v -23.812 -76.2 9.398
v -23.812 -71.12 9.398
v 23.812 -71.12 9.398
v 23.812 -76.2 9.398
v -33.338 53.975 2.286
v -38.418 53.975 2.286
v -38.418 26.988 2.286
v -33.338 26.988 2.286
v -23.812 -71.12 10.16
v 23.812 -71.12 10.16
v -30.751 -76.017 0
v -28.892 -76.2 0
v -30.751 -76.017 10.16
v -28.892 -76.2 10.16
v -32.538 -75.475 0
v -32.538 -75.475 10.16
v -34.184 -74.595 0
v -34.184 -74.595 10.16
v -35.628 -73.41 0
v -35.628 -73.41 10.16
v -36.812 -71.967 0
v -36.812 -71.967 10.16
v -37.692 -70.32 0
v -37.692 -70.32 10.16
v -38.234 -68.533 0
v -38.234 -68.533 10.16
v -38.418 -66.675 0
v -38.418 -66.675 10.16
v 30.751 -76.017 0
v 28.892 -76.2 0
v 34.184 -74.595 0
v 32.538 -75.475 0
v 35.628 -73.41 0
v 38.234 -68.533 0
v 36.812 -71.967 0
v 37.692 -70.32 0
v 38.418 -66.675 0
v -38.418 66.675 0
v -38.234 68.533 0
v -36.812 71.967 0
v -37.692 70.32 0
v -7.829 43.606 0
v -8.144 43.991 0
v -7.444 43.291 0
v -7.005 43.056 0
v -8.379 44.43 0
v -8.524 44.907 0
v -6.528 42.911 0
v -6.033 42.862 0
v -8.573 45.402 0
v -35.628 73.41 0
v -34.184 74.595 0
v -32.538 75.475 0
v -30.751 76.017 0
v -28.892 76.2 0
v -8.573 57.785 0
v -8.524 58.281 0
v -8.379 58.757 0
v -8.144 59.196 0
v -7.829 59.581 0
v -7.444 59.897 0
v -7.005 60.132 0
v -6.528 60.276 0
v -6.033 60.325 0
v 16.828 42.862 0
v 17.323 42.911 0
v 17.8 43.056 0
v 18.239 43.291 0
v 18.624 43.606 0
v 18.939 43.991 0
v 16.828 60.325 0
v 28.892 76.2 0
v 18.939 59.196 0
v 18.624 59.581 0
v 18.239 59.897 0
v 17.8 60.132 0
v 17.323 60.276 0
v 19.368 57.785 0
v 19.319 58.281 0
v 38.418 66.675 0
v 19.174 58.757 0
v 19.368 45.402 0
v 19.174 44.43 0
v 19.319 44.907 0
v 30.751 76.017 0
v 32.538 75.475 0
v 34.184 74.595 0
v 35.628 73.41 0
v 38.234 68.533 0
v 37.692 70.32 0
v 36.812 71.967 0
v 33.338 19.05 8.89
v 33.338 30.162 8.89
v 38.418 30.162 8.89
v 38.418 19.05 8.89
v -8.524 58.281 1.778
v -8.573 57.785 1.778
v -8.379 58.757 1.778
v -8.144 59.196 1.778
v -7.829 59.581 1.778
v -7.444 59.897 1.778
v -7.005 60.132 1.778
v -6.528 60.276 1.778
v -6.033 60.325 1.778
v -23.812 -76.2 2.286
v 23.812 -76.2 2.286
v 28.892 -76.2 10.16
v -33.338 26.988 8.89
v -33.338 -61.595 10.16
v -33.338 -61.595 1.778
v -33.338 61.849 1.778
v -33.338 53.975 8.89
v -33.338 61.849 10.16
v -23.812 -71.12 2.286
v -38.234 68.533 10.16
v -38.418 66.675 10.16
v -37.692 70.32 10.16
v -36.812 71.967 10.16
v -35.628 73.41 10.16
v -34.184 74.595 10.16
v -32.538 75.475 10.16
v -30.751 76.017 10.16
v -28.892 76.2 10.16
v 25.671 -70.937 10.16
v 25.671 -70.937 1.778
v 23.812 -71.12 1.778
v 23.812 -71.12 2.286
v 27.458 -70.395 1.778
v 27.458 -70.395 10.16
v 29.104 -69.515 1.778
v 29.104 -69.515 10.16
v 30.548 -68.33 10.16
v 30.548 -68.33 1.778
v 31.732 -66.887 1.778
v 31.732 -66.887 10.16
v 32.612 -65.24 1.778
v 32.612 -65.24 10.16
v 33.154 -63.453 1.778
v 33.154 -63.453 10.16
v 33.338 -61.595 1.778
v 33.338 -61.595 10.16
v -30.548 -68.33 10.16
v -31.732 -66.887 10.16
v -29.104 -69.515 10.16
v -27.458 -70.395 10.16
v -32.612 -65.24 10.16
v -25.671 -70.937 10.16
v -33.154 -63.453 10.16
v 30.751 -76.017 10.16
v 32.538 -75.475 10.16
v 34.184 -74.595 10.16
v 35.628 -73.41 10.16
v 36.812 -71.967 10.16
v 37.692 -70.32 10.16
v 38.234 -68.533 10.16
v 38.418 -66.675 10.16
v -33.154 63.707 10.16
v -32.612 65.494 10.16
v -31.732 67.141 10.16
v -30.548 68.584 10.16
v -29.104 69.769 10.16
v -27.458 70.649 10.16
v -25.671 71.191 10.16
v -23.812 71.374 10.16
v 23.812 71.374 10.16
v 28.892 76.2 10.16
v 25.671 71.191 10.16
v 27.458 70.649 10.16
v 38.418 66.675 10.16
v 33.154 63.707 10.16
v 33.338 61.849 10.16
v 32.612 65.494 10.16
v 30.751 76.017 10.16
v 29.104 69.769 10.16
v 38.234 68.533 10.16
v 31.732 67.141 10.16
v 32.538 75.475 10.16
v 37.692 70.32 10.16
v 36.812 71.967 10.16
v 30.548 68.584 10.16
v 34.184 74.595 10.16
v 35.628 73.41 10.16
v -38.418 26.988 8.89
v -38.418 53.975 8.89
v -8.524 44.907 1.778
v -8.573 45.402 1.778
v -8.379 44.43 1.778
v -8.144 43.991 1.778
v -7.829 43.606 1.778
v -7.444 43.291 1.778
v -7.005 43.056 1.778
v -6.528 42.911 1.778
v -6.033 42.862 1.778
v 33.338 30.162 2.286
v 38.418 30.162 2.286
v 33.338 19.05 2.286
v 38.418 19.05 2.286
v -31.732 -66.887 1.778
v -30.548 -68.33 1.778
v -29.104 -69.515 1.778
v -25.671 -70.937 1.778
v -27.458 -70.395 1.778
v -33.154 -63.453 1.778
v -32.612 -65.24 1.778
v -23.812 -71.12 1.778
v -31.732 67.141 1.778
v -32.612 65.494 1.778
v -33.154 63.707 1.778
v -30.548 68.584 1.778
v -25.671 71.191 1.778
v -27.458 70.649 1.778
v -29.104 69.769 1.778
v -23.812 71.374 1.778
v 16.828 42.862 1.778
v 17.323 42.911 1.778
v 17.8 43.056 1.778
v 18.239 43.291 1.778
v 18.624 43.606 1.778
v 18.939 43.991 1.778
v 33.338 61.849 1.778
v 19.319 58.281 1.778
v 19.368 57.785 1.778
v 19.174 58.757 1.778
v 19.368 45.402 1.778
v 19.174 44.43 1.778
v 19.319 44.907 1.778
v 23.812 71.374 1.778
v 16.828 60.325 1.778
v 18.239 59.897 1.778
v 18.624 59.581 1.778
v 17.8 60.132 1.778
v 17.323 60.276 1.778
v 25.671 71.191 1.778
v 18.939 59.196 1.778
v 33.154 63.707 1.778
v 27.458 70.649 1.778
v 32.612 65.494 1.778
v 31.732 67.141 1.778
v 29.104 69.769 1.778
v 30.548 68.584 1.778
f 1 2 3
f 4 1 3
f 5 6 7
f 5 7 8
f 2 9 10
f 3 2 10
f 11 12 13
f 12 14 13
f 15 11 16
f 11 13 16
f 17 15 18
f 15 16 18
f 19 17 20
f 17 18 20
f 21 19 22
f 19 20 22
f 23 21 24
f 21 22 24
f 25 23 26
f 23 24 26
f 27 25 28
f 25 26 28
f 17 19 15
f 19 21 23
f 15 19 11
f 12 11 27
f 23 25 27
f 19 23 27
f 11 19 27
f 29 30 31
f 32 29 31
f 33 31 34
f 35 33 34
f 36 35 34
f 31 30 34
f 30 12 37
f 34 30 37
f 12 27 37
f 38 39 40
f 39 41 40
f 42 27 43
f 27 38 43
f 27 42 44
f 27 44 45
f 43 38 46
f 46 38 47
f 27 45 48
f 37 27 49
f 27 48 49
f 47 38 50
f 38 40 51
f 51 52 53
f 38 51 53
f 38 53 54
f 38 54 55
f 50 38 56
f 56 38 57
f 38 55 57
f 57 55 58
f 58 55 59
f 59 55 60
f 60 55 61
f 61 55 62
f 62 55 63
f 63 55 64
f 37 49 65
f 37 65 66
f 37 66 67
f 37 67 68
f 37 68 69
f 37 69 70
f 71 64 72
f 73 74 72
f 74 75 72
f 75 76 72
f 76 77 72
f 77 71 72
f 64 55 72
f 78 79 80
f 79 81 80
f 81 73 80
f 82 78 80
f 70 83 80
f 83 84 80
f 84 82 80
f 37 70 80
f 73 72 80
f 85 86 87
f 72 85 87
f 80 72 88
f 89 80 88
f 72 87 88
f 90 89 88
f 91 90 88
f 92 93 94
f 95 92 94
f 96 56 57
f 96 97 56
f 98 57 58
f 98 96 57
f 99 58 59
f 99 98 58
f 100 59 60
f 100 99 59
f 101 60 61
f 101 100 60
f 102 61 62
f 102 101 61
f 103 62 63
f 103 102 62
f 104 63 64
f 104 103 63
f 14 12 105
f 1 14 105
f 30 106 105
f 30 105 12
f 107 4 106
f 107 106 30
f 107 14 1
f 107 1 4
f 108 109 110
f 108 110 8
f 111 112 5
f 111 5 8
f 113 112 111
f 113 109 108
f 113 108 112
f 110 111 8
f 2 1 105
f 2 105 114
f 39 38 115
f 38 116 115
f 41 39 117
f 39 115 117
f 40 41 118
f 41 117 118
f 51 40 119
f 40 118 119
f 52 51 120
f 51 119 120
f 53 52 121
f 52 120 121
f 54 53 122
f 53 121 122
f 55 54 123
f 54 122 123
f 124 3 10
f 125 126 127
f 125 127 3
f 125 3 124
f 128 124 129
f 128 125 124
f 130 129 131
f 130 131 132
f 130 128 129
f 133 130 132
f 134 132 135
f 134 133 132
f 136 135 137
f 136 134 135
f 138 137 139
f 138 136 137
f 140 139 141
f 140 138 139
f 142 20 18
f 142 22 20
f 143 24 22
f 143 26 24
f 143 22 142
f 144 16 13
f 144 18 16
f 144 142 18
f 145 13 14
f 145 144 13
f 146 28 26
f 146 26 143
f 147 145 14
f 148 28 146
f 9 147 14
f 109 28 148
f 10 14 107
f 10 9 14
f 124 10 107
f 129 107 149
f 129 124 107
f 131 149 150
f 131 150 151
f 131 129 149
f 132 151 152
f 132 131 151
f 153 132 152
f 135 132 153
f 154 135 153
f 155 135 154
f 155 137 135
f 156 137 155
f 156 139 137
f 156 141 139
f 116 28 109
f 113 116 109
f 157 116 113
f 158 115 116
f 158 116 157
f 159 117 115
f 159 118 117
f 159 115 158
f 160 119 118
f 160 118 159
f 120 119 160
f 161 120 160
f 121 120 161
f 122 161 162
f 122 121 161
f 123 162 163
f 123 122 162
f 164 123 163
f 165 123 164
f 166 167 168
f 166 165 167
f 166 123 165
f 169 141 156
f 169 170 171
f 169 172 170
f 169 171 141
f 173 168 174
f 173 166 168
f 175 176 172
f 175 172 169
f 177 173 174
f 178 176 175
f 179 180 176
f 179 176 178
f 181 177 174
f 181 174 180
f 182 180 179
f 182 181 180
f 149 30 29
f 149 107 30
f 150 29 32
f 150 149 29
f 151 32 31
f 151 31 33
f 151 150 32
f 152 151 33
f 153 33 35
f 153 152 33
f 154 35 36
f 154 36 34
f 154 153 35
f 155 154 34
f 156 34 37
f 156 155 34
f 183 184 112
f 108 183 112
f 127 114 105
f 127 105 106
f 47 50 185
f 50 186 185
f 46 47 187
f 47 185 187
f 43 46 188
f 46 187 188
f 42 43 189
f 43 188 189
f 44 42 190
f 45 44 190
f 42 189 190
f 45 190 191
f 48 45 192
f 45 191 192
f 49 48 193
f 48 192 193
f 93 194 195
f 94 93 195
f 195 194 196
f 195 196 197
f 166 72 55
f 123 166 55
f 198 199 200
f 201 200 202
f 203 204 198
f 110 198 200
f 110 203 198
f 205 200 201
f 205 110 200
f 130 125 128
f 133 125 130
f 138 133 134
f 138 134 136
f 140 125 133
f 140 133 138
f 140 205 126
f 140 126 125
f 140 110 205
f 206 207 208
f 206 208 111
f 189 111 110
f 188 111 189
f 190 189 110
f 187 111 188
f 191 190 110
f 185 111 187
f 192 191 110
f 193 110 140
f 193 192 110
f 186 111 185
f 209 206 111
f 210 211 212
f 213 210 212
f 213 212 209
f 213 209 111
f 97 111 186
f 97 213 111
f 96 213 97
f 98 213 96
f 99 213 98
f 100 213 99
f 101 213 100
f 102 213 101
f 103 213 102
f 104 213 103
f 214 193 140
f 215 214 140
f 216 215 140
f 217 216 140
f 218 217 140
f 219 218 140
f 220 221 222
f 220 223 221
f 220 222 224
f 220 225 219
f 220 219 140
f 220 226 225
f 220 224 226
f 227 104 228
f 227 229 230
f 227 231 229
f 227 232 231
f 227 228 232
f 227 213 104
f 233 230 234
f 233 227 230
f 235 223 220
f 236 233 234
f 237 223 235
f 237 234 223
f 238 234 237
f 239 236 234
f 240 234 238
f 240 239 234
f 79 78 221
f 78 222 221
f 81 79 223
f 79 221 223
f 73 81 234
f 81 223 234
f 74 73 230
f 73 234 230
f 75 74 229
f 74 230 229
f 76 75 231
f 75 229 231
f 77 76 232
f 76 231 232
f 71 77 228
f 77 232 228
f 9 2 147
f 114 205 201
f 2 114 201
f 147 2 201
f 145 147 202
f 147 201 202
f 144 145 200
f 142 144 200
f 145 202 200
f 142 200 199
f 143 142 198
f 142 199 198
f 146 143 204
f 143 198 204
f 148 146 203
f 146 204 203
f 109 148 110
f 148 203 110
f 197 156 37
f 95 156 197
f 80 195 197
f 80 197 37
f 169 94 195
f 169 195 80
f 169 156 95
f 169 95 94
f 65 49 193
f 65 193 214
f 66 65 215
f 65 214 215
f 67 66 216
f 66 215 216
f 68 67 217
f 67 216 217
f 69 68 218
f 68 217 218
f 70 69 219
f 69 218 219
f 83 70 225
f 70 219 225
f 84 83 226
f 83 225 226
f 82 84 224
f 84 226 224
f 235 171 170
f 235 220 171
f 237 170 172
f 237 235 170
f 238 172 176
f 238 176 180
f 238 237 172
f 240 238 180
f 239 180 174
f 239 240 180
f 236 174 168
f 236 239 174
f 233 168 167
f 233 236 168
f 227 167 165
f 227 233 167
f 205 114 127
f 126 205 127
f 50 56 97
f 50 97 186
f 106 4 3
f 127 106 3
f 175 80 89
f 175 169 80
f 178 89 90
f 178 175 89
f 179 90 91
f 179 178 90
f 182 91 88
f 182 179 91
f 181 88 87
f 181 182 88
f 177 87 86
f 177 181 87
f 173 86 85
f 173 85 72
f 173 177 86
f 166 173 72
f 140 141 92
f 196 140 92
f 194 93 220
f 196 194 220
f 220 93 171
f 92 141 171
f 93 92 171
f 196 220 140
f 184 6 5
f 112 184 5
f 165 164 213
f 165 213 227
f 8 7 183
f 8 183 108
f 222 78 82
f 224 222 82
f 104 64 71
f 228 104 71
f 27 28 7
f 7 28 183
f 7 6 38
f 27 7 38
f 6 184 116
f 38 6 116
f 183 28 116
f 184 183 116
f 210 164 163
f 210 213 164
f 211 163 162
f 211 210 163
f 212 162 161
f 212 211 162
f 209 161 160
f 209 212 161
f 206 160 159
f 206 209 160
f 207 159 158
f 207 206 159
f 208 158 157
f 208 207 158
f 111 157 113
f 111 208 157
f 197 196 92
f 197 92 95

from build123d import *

# Parameters (mm, degrees)
F0_W      = 66.675
F0_H      = 142.24
F1_DEPTH  = 10.16
F2_W      = 66.675
F2_H      = 142.494
F3_DEPTH  = 8.382
F4_R      = 9.525
F5_W      = 47.625
F5_H      = 5.08
F5_W_2    = 5.08
F5_H_2    = 11.1125
F5_H_3    = 26.9875
F6_DEPTH  = 7.874
F7_W      = 27.94
F7_H      = 17.4625
F8_DEPTH  = 2.286
F9_R      = 2.54
F10_W     = 5.08
F10_H     = 26.9875
F11_DEPTH = 1.27
F12_W     = 5.08
F12_H     = 11.1125
F13_DEPTH = 1.27
F14_W     = 47.625
F14_H     = 5.08
F15_DEPTH = 0.762


with BuildPart() as f1:
    # F0 (on Top) → F1 (new body)
    with BuildSketch(Plane.XY):
        Polygon((-38.4175, -76.2), (-33.3375, -76.2), (38.4175, -76.2), (38.4175, 76.2), (-38.4175, 76.2), align=None)
        Rectangle(F0_W, F0_H, mode=Mode.SUBTRACT)
        Rectangle(F0_W, F0_H)
    extrude(amount=F1_DEPTH)

    # F2 (on face) → F3 (cut)
    with BuildSketch(Plane.XY.offset(10.16)):
        with Locations((0, 0.127)):
            Rectangle(F2_W, F2_H)
    extrude(amount=-F3_DEPTH, mode=Mode.SUBTRACT)

    # F4
    f4_edges = [f1.edges().sort_by_distance(p)[0] for p in [
        (-38.4175, 76.2, 5.08),
        (-38.4175, -76.2, 5.08),
        (-33.3375, 71.374, 5.969),
        (-33.3375, -71.12, 5.969),
        (33.3375, -71.12, 5.969),
        (38.4175, -76.2, 5.08),
        (38.4175, 76.2, 5.08),
        (33.3375, 71.374, 5.969),
    ]]
    fillet(f4_edges, radius=F4_R)

    # F5 (on face) → F6 (cut)
    with BuildSketch(Plane.XY.offset(10.16)):
        with Locations((0, -73.66)):
            Rectangle(F5_W, F5_H)
        with Locations((35.8775, 24.60625)):
            Rectangle(F5_W_2, F5_H_2)
        with Locations((-35.8775, 40.48125)):
            Rectangle(F5_W_2, F5_H_3)
    extrude(amount=-F6_DEPTH, mode=Mode.SUBTRACT)

    # F7 (on face) → F8 (cut)
    with BuildSketch(Plane(origin=(0, 0, 0), x_dir=(1, 0, 0), z_dir=(0, 0, -1))):
        with Locations((5.3975, -51.59375)):
            Rectangle(F7_W, F7_H)
    extrude(amount=-F8_DEPTH, mode=Mode.SUBTRACT)

    # F9
    f9_edges = [f1.edges().sort_by_distance(p)[0] for p in [
        (19.3675, 60.325, 0.889),
        (-8.5725, 60.325, 0.889),
        (-8.5725, 42.8625, 0.889),
        (19.3675, 42.8625, 0.889),
    ]]
    fillet(f9_edges, radius=F9_R)

    # F10 (on face) → F11 (join)
    with BuildSketch(Plane.XY.offset(10.16)):
        with Locations((-35.8775, 40.48125)):
            Rectangle(F10_W, F10_H)
    extrude(amount=-F11_DEPTH)

    # F12 (on face) → F13 (join)
    with BuildSketch(Plane.XY.offset(10.16)):
        with Locations((35.8775, 24.60625)):
            Rectangle(F12_W, F12_H)
    extrude(amount=-F13_DEPTH)

    # F14 (on face) → F15 (join)
    with BuildSketch(Plane.XY.offset(10.16)):
        with Locations((0, -73.66)):
            Rectangle(F14_W, F14_H)
    extrude(amount=-F15_DEPTH)


solid = f1.part
